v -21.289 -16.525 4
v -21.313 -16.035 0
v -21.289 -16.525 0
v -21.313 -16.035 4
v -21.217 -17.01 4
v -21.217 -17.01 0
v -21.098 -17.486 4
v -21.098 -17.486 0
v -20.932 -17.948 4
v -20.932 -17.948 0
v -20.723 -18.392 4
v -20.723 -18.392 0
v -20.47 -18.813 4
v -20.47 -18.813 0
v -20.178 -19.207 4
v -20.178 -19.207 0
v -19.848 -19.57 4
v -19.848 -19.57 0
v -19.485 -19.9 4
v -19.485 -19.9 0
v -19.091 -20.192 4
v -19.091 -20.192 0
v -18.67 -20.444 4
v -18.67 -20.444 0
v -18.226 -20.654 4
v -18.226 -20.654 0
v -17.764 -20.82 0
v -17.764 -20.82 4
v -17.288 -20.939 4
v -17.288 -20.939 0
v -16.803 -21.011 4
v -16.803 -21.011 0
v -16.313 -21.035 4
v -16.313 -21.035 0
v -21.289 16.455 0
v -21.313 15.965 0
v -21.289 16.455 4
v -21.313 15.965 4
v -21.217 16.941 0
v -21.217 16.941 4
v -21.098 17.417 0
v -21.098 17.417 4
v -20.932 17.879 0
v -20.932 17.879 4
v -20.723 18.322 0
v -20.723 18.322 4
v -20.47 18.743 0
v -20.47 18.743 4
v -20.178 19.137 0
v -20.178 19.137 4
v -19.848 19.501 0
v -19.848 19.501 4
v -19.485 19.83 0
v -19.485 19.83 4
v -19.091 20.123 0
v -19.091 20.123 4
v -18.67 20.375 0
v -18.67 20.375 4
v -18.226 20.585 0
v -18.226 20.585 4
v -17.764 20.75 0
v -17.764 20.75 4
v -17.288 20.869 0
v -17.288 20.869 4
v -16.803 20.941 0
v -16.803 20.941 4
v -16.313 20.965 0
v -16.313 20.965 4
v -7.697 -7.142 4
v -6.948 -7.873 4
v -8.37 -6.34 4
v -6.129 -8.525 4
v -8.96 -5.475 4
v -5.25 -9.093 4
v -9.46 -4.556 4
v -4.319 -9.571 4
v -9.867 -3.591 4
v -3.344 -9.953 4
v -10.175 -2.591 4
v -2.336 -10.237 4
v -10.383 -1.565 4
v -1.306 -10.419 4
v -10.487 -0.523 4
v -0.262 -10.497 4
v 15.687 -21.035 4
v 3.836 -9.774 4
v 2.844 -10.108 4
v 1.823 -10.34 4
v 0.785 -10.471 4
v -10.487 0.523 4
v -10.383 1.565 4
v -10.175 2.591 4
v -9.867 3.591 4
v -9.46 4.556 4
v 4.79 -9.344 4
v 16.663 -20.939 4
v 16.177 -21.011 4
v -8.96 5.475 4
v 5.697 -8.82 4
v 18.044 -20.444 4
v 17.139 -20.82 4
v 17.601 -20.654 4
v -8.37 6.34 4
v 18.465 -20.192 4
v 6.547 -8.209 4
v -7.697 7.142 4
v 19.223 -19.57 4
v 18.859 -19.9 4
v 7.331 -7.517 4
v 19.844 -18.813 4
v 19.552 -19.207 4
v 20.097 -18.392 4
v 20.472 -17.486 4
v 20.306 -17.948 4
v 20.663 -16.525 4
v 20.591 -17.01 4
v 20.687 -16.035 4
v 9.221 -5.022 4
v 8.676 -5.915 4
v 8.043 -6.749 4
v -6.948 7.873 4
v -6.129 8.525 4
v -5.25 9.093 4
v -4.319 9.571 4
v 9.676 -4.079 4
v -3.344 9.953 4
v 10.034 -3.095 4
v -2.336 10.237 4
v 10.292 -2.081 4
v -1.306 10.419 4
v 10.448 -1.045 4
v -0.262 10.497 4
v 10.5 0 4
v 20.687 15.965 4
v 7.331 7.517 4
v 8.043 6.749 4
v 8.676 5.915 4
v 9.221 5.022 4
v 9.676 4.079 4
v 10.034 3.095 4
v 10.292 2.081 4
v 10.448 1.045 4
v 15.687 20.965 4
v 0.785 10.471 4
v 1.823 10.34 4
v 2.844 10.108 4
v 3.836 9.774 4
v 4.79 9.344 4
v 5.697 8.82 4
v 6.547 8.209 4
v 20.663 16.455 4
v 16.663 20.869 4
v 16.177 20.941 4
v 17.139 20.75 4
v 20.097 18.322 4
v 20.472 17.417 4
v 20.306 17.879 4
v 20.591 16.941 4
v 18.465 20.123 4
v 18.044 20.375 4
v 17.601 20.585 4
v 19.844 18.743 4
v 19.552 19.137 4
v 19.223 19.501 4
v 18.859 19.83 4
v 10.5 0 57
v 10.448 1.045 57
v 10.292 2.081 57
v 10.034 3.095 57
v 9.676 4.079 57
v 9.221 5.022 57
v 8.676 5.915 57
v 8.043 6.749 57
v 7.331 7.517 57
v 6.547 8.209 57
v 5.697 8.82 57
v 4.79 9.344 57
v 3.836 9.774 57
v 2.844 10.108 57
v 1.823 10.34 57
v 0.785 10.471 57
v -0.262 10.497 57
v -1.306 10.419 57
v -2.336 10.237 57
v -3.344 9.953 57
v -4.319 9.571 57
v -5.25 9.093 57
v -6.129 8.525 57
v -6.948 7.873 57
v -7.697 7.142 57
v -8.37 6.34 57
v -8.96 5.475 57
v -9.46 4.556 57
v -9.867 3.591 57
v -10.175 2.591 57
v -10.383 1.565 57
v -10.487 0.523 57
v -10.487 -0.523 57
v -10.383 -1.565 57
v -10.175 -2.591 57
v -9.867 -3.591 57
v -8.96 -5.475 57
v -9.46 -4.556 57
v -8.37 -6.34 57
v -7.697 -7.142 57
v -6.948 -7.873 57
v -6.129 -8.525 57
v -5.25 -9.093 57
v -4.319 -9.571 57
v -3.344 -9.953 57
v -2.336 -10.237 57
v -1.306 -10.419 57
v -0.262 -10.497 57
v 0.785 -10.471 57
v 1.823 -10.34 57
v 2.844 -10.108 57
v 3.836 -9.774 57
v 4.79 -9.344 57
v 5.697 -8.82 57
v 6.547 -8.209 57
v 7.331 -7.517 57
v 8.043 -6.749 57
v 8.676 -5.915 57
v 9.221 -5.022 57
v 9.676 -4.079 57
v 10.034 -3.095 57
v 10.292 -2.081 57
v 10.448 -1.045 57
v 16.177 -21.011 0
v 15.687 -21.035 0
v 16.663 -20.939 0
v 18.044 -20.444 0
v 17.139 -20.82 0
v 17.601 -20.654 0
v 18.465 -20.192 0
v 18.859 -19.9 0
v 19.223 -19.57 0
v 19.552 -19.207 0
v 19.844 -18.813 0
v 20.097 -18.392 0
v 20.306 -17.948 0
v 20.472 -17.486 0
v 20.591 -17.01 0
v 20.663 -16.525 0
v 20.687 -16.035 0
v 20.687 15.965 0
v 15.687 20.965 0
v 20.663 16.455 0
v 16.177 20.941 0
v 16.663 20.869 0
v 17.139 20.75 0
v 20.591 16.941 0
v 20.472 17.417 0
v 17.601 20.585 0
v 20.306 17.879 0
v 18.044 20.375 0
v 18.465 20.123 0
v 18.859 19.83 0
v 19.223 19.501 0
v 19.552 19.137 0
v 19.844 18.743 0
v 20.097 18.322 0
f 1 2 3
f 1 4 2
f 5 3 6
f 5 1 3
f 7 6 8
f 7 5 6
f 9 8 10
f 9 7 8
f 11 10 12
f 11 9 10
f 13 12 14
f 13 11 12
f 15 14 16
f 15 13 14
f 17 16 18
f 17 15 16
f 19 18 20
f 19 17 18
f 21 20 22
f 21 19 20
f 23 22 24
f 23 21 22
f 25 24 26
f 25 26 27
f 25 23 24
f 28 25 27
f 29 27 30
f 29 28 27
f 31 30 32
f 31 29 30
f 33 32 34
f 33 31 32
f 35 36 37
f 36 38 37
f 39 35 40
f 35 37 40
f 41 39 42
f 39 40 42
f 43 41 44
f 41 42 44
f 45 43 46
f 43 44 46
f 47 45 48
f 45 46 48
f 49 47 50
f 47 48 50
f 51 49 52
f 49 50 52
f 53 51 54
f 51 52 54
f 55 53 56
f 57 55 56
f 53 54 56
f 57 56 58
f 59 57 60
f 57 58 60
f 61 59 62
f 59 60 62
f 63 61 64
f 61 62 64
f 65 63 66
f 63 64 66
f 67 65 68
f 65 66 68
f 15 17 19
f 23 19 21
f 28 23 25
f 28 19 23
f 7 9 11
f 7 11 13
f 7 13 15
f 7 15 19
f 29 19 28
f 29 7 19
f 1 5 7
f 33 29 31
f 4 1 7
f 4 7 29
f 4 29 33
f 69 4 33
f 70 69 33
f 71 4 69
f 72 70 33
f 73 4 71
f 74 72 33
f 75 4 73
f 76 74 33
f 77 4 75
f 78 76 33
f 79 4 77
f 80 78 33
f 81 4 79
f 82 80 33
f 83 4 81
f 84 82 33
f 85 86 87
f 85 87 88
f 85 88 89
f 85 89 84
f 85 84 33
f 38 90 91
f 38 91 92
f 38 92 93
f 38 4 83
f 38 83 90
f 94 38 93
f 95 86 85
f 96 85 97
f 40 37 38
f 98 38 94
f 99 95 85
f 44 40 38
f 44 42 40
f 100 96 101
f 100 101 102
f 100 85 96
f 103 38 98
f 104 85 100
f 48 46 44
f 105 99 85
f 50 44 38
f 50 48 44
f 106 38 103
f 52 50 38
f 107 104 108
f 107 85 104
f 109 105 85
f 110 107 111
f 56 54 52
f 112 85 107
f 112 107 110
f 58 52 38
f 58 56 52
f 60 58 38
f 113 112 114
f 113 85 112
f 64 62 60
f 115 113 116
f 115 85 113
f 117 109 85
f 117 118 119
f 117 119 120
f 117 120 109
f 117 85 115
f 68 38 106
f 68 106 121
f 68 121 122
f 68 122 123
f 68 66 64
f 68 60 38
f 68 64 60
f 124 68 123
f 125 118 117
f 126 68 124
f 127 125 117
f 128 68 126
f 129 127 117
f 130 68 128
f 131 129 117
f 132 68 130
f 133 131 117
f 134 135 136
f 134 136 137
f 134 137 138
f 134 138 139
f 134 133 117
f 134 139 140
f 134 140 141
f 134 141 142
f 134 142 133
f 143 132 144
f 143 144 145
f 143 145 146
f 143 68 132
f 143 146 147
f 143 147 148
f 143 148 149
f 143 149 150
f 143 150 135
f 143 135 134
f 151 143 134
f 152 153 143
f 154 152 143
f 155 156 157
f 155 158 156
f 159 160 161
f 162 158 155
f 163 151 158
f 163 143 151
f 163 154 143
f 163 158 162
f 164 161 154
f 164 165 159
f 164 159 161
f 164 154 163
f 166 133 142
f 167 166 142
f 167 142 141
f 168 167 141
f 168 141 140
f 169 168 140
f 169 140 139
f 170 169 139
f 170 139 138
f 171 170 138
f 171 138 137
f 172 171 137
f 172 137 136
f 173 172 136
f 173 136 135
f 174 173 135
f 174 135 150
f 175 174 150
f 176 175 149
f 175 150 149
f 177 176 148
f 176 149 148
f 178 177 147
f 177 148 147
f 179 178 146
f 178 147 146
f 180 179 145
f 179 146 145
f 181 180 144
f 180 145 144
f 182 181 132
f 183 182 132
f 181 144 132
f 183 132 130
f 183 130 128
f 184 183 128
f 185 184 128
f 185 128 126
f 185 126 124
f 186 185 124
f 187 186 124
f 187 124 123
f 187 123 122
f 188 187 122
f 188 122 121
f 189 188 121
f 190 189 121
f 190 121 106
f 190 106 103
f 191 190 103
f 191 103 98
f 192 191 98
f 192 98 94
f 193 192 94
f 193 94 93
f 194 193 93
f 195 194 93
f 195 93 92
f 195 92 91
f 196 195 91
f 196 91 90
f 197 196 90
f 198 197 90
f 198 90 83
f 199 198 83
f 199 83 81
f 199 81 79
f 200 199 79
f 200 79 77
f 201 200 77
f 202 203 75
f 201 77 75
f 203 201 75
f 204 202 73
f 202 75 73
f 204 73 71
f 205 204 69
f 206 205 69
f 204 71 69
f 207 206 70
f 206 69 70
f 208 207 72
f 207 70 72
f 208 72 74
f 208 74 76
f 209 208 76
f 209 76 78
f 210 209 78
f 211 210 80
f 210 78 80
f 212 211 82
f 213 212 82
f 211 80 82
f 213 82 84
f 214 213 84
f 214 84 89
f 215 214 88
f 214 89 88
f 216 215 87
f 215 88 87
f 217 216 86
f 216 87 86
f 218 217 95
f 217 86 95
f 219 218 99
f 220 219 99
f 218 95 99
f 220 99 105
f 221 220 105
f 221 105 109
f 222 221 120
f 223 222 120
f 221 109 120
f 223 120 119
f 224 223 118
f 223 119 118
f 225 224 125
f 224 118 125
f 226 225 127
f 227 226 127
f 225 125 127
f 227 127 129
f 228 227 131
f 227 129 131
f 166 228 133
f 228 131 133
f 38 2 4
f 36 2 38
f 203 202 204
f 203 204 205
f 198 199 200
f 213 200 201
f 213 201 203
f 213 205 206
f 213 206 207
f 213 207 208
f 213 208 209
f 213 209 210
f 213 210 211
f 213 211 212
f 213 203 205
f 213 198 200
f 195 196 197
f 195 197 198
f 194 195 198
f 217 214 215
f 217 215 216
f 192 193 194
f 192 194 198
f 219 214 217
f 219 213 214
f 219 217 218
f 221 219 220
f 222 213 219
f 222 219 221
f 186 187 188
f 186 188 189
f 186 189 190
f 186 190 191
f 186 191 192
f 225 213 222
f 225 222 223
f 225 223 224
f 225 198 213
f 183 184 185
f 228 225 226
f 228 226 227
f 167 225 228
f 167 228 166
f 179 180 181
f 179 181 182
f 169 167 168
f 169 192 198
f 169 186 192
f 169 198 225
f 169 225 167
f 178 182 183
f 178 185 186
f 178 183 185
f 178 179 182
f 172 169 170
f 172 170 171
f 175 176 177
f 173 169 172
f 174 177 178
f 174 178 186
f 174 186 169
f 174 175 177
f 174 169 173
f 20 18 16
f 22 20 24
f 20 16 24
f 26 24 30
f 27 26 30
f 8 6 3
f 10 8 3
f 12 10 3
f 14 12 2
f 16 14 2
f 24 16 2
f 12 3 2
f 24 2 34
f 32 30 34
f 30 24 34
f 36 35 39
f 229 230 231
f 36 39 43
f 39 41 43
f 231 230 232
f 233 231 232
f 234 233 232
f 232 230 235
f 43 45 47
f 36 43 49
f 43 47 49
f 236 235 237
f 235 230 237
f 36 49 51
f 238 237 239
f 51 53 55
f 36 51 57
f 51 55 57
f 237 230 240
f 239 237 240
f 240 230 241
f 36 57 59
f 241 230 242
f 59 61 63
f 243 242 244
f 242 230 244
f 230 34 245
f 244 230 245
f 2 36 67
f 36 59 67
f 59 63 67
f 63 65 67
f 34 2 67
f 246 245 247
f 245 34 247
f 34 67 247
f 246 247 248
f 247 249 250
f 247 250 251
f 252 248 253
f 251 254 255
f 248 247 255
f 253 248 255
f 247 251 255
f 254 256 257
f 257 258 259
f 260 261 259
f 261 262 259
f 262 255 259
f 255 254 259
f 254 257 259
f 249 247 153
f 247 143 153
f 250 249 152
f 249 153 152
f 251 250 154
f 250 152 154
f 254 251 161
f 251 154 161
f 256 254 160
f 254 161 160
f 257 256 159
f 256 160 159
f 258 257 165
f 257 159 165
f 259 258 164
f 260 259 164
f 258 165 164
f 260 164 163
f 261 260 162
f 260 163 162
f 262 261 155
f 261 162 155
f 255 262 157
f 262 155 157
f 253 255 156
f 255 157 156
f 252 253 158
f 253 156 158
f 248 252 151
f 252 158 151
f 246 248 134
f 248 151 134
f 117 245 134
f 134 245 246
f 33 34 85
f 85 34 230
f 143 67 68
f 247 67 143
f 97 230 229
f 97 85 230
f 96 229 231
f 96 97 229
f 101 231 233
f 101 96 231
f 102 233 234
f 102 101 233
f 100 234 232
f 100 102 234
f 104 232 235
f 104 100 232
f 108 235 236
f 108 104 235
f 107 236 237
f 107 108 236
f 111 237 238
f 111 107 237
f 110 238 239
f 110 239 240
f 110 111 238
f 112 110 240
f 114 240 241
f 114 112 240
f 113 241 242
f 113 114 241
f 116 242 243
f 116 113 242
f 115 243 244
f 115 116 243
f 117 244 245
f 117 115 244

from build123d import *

# Parameters (mm, degrees)
F0_W     = 42
F0_H     = 42
F0_R     = 10.5
F1_DEPTH = 4
F2_DEPTH = 57
F3_R     = 5


with BuildPart() as f1:
    # F0 (on Top) → F1 (new body)
    with BuildSketch(Plane.XY):
        with Locations((-0.312906, -0.03483)):
            Rectangle(F0_W, F0_H)
        Circle(F0_R, mode=Mode.SUBTRACT)
        Circle(F0_R)
    extrude(amount=F1_DEPTH)

    # F0 (on Top) → F2 (join)
    with BuildSketch(Plane.XY):
        Circle(F0_R)
    extrude(amount=F2_DEPTH)

    # F3
    f3_edges = [f1.edges().sort_by_distance(p)[0] for p in [
        (-21.312906, -21.03483, 2),
        (-21.312906, 20.96517, 2),
        (20.687094, -21.03483, 2),
        (20.687094, 20.96517, 2),
    ]]
    fillet(f3_edges, radius=F3_R)


solid = f1.part
